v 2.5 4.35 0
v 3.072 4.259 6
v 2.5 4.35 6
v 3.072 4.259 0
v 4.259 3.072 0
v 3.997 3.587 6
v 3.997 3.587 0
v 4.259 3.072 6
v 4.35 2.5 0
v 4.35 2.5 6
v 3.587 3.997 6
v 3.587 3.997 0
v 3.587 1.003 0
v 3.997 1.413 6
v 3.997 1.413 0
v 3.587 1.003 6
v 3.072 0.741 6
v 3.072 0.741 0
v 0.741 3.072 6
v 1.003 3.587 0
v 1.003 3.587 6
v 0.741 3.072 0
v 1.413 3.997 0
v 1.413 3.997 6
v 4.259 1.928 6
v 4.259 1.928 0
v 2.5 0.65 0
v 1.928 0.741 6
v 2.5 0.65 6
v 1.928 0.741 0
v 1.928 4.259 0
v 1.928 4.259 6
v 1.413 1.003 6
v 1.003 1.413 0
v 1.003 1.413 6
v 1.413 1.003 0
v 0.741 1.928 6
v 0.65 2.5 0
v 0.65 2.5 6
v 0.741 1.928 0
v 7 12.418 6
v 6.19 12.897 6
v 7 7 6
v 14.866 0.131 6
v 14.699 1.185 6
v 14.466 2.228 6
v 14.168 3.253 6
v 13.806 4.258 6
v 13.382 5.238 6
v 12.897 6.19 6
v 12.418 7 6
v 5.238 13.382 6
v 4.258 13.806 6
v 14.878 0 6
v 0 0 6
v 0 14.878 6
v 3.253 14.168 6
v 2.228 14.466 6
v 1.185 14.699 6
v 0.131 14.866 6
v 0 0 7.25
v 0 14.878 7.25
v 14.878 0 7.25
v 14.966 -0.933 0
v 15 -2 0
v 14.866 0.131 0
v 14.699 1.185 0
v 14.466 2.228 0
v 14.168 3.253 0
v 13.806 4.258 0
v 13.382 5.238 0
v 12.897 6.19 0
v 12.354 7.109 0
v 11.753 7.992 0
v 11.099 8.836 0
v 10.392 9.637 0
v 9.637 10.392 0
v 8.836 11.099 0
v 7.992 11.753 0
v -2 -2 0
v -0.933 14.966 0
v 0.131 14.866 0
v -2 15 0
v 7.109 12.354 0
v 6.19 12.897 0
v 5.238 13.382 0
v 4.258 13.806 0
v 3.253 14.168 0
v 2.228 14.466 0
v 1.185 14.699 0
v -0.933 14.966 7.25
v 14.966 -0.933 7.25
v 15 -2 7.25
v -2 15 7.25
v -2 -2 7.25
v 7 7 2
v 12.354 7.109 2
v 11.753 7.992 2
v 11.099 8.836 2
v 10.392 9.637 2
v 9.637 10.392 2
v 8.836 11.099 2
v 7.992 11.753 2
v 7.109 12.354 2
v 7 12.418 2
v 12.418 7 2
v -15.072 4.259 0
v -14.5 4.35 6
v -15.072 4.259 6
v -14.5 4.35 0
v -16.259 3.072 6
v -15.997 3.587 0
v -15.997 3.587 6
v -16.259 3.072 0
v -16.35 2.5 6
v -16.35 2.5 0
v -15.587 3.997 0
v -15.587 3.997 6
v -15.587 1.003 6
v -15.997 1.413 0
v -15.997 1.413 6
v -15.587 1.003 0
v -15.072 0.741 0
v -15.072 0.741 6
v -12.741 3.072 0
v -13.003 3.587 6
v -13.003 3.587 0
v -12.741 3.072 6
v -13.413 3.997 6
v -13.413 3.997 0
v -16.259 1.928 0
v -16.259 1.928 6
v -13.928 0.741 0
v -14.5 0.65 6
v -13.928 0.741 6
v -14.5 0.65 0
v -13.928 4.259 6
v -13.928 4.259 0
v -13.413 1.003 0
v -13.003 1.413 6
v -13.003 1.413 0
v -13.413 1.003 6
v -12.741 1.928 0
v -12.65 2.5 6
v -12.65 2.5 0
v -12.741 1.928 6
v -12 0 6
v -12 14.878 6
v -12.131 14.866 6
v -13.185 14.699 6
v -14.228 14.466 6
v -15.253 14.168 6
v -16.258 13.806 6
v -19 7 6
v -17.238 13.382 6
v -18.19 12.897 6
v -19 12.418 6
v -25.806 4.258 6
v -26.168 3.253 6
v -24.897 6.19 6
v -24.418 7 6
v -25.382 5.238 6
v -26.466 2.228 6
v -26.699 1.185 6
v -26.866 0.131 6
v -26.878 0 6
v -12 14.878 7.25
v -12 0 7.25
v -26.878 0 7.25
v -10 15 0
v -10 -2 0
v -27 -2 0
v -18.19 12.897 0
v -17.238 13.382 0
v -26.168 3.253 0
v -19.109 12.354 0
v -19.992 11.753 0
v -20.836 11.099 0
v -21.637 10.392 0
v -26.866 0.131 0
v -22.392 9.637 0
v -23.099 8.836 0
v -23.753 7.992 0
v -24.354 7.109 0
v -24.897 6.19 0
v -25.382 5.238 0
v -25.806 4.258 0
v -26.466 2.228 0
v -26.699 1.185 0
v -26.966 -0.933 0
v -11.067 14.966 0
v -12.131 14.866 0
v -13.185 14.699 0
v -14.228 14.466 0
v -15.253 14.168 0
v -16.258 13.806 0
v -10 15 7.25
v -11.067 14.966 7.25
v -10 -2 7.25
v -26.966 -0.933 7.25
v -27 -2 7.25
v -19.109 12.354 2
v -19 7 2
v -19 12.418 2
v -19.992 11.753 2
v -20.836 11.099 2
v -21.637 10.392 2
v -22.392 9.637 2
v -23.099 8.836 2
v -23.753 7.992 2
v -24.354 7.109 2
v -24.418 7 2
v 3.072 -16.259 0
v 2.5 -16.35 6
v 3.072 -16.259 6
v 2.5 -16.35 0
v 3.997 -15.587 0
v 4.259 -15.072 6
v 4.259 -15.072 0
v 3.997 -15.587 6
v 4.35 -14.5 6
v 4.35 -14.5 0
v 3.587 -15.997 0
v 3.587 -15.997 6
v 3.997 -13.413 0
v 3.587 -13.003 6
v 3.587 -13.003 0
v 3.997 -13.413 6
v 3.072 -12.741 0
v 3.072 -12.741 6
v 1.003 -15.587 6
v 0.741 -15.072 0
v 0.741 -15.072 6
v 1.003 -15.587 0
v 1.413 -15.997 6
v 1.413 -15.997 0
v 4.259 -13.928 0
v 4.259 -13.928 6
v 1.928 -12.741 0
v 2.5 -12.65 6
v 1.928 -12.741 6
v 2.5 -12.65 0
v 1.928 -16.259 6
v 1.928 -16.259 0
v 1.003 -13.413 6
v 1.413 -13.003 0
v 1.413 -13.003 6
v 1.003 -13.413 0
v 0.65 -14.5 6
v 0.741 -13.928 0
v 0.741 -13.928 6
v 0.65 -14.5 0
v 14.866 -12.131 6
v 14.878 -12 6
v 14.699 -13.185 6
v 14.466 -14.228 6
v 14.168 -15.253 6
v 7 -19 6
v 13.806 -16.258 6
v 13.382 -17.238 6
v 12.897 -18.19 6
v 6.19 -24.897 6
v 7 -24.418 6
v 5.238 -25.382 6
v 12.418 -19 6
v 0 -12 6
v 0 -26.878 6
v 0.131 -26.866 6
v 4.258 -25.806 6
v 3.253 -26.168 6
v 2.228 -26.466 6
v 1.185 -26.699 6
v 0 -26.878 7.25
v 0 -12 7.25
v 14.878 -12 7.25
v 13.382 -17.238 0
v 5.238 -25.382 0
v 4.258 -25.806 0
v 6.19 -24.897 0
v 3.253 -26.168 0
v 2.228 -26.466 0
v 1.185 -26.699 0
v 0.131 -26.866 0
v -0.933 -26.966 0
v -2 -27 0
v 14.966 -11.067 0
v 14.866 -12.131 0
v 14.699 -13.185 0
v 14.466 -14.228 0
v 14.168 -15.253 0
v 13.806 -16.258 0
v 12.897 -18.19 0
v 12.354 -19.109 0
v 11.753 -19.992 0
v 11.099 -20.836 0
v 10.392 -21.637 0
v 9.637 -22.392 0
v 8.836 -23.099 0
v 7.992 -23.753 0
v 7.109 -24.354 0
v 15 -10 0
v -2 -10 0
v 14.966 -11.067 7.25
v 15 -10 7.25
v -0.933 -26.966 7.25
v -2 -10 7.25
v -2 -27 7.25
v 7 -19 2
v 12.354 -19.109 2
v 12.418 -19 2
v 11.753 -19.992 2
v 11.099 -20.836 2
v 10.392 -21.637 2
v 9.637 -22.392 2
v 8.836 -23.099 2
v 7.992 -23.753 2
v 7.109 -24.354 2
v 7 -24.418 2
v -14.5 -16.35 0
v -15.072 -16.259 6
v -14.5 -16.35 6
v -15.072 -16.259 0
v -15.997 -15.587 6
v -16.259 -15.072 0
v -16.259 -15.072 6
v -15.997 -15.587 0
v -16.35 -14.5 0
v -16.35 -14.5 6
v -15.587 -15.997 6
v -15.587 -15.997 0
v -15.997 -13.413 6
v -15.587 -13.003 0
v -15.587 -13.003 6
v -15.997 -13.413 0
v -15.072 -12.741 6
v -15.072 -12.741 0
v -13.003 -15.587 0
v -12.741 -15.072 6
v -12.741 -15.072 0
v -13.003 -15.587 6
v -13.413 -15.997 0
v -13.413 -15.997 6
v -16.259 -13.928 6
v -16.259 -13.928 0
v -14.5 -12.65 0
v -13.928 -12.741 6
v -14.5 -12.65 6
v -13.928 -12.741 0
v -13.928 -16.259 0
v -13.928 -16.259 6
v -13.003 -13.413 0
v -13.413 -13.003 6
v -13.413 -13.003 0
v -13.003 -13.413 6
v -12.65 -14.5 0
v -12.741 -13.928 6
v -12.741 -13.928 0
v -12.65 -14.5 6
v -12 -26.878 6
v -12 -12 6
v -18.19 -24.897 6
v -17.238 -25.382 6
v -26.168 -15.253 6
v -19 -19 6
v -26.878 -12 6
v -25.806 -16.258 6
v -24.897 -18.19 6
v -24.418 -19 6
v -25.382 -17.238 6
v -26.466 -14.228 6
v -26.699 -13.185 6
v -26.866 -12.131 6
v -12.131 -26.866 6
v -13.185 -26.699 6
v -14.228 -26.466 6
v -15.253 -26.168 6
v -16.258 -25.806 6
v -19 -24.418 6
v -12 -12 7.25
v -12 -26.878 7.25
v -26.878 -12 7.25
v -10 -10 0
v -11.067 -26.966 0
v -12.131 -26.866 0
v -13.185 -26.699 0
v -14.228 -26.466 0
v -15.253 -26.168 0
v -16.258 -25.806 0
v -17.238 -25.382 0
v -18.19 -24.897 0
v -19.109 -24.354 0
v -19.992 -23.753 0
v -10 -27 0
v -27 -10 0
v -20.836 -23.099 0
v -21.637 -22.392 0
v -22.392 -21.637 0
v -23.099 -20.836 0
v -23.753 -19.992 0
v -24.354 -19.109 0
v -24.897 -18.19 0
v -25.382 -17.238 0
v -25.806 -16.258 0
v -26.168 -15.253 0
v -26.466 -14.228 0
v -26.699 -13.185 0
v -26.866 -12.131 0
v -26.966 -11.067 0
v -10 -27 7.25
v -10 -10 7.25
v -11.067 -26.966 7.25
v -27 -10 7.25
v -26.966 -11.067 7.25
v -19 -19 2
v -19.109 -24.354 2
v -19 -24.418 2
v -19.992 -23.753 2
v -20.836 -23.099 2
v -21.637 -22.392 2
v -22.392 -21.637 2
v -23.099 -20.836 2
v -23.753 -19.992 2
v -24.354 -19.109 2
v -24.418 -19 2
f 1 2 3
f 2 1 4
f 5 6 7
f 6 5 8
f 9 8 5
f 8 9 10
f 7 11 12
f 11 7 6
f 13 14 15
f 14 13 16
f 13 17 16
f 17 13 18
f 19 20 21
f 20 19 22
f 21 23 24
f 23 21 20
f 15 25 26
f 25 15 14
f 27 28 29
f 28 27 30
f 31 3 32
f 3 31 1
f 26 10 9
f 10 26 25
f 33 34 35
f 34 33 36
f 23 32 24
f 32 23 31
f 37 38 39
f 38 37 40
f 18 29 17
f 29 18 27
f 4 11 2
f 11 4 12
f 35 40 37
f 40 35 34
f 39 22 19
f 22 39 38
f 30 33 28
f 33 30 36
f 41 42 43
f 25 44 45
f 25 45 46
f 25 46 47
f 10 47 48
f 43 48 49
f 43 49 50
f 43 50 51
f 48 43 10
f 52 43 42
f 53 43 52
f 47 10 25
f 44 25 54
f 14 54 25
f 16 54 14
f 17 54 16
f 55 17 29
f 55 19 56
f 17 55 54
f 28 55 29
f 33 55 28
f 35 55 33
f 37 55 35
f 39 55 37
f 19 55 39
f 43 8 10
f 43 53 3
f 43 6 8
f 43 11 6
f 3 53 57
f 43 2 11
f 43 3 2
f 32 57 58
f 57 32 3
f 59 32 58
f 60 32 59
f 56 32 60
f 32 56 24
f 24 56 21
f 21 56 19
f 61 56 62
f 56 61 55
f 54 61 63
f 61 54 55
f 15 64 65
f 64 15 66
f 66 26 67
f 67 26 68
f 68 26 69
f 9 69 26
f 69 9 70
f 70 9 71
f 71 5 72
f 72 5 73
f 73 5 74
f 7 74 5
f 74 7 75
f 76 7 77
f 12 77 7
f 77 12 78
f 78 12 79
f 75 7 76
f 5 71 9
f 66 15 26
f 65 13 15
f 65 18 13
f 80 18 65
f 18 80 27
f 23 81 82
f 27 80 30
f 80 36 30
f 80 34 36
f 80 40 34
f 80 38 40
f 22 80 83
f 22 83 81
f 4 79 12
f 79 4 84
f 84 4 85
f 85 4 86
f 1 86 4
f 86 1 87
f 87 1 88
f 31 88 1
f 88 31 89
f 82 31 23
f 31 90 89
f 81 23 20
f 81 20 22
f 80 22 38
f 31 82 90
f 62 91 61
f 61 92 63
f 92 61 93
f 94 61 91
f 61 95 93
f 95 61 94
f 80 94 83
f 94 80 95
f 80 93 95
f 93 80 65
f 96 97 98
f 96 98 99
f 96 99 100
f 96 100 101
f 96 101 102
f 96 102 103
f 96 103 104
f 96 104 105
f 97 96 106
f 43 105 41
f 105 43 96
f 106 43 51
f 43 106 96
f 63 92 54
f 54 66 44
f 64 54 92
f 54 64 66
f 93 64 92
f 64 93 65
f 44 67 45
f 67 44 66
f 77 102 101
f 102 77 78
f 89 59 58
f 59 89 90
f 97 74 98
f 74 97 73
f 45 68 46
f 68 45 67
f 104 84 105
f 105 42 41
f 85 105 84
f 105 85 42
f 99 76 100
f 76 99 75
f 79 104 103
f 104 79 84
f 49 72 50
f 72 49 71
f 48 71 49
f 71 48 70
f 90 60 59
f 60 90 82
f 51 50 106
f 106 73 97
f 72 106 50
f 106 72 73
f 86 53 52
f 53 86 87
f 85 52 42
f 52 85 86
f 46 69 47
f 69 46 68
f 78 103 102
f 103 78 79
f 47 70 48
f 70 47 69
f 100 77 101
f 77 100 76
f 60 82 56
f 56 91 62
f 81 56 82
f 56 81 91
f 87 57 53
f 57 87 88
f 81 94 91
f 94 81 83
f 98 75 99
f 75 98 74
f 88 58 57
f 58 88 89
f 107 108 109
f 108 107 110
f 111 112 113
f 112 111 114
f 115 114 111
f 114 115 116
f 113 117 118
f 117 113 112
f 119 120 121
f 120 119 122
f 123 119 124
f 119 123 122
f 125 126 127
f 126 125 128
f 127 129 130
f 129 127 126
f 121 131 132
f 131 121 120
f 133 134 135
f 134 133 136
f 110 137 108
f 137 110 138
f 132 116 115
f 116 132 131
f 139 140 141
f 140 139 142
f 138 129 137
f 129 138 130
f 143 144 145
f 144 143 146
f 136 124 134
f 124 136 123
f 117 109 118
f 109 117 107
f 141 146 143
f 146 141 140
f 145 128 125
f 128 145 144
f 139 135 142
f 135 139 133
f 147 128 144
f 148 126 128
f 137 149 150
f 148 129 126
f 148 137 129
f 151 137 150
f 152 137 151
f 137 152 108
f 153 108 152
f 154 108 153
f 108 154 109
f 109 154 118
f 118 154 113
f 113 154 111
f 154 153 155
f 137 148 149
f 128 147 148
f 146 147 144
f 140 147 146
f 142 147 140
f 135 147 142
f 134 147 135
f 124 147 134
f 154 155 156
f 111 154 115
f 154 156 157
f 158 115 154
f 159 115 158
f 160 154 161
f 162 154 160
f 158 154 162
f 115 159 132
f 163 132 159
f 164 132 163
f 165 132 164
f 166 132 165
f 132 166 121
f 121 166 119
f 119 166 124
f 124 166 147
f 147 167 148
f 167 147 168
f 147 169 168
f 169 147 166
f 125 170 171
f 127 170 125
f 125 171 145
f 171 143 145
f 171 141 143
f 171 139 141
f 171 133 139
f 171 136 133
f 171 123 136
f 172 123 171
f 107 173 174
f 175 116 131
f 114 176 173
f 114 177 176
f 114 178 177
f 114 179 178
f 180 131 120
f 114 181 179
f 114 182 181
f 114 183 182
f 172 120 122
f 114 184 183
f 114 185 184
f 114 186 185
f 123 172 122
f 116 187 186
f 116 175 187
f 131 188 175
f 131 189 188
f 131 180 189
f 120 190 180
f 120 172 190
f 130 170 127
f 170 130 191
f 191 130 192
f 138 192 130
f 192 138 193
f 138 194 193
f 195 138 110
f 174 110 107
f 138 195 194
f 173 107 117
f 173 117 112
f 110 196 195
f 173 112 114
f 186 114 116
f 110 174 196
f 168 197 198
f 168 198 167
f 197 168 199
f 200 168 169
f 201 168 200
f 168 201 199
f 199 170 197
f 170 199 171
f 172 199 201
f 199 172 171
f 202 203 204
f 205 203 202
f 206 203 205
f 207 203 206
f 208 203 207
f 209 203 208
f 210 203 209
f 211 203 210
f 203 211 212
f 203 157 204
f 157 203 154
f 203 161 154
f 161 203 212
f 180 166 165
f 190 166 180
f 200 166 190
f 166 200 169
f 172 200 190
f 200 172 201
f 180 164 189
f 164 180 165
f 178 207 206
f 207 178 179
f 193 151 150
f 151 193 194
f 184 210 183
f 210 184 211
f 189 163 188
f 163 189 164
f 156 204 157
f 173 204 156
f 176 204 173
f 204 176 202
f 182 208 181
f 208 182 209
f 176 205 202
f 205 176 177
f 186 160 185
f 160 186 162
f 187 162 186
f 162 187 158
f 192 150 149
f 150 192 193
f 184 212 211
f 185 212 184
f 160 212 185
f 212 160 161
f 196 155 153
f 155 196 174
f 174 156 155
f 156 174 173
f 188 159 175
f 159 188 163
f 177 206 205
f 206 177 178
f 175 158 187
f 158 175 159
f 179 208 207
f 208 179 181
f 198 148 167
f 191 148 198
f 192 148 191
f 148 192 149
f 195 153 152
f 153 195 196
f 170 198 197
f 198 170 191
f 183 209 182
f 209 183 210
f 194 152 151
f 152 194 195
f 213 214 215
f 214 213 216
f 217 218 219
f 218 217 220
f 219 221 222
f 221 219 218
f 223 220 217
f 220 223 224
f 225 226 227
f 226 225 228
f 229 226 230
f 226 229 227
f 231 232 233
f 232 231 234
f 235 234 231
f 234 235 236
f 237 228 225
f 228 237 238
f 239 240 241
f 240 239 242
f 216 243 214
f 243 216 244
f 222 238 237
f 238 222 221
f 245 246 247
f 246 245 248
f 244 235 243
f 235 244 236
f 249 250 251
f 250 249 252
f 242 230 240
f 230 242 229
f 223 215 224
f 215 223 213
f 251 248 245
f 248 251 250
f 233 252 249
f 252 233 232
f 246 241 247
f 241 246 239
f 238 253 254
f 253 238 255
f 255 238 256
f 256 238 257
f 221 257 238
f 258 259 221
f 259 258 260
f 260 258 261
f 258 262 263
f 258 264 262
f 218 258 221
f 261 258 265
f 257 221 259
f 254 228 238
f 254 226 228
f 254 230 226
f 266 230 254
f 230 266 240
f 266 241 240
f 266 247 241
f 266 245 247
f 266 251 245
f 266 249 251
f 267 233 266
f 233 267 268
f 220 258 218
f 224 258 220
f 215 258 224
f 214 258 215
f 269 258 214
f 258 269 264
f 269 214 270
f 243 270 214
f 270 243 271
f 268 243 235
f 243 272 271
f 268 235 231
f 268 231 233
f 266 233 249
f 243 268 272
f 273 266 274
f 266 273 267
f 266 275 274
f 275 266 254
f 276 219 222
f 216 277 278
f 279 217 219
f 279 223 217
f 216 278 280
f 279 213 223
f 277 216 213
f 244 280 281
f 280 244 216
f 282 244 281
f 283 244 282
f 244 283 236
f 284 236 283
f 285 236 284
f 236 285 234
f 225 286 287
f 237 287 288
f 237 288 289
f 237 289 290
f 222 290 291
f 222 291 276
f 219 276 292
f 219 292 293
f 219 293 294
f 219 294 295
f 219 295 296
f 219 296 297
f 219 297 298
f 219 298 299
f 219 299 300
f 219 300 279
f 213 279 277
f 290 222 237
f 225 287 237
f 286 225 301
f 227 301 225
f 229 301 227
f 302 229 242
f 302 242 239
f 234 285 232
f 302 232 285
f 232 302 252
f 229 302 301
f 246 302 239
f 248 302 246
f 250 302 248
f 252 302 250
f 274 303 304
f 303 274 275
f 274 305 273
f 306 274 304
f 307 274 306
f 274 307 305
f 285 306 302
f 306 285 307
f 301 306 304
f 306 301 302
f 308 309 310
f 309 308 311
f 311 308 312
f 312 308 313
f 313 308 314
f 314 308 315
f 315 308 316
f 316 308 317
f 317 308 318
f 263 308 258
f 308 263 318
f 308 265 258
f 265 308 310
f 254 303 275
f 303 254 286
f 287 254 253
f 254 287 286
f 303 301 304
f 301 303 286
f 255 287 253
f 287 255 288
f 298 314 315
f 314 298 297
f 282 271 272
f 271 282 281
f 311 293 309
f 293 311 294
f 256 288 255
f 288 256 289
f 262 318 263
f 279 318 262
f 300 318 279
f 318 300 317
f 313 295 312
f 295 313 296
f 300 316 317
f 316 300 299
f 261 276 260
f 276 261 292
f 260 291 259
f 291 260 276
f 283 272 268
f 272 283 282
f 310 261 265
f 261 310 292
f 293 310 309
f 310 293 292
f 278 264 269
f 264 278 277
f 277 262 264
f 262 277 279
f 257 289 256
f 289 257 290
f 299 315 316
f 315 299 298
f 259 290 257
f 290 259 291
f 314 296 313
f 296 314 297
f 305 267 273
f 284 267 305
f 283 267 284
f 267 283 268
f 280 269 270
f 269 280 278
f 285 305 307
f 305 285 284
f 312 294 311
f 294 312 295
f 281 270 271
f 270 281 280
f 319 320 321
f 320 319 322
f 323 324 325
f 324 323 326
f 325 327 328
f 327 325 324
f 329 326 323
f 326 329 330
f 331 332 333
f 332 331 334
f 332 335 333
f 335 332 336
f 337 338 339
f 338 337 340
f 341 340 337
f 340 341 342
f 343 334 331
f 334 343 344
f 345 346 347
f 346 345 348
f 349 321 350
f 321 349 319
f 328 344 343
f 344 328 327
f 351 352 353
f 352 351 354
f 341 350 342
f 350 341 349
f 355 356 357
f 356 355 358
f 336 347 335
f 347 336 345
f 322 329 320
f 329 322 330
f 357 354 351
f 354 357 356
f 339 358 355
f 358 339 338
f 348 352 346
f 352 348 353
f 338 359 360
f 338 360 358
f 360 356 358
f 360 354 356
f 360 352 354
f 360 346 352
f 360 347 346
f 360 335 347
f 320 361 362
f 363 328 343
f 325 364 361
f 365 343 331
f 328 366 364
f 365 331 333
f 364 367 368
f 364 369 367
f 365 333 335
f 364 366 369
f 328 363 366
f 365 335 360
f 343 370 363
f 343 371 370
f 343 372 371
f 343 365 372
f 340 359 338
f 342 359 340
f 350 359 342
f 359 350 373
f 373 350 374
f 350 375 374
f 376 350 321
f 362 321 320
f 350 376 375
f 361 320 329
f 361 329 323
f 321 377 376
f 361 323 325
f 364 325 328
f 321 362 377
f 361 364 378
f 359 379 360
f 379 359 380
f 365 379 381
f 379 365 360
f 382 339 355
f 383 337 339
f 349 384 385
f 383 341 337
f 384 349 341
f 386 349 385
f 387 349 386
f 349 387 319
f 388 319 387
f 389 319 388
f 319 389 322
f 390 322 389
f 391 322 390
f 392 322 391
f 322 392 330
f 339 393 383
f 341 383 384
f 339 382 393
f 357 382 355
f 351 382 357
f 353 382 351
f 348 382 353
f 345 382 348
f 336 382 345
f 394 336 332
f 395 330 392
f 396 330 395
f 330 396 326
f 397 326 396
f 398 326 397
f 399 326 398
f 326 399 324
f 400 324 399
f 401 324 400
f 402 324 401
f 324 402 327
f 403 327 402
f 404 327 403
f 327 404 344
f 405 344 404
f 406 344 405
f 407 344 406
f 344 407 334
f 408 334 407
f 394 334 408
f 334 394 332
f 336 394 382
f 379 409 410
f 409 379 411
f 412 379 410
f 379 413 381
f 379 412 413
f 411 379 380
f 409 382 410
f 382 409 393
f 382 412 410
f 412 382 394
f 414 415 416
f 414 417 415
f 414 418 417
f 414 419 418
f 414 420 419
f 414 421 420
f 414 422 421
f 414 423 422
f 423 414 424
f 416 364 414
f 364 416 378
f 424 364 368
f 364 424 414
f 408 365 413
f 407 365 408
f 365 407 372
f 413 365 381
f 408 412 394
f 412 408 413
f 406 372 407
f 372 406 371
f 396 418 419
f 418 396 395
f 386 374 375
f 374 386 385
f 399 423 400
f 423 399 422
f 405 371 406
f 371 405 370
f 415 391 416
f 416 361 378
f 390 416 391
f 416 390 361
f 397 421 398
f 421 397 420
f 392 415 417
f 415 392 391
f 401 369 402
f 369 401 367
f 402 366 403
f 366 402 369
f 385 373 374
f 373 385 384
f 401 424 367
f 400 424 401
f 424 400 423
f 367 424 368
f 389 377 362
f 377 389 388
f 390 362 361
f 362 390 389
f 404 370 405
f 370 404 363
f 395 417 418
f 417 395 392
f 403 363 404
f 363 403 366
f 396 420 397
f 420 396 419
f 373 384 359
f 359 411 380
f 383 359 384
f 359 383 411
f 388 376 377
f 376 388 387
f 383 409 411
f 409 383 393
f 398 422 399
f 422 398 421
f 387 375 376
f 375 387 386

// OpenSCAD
// [FL_INDEX: keywords="openscad, 3d_parametric, Heated_bed_glass_mount_clip, csg_solid" | COT="Parametric OpenSCAD design from 3DCodeverse"]
// Title: Heated bed glass mount clip

/* [HeatedBed] */

hotBedThickness = 2.5;
hotBedSizeX = 214; 
hotBedSizeY = 214; 
hotBedMountPointX = 2.5;
hotBedMountPointY = 2.5;
hotBedMountPointDiameter = 3.7;

/* [Glass] */

glassThickness = 4;
glassSizeX = 200;
glassSizeY = 200; 

/* [Mount] */

mountTopThickness = 2;
mountBorderThickness = 2;
mountGlassBorderThickness = 4;
mountSize = 15;


/* [Hidden] */

hotBedBoltLength = 20;

// Calculations
hotBedMountPoints = [[hotBedMountPointX,hotBedMountPointY,0],
							[hotBedMountPointX,hotBedSizeY-hotBedMountPointY,0],
							[hotBedSizeX-hotBedMountPointX,hotBedSizeY-hotBedMountPointY,0],
							[hotBedSizeX-hotBedMountPointX,hotBedMountPointY,0]];

// Hot Bed
module HotBed(){
	difference() {
		color("OrangeRed", 1) 
			cube([hotBedSizeX, hotBedSizeY, hotBedThickness]);
		HotBedBolts();
/*
		for (i = hotBedMountPoints)
		{
			translate(i) 
				cylinder(h=hotBedThickness,r=hotBedMountPointDiameter/2, $fn=10);
		}
*/
	}
}

module HotBedBolts(){
	for (i = hotBedMountPoints)
	{
		translate(i+[0,0,-5]) 
			cylinder(h=hotBedThickness+glassThickness+10,r=hotBedMountPointDiameter/2, $fn=20);
	}
}

module Glass() {
	glassPosition = [(hotBedSizeX-glassSizeX)/2,(hotBedSizeY-glassSizeY)/2,hotBedThickness];
	color("Azure",0.7) 
		translate(glassPosition) cube([glassSizeX, glassSizeY, glassThickness]);
}

module GlassMount() {
	mountTotalHeight=hotBedThickness/2+glassThickness+mountTopThickness;
	mountPosition=[-mountBorderThickness,-mountBorderThickness,hotBedThickness/2];
	intersection() {
	difference(){
		translate(mountPosition) 
			color("Blue")
				cube([mountSize+mountBorderThickness,mountSize+mountBorderThickness,mountTotalHeight]);	
		HotBed();
		HotBedBolts();
		Glass();
		// Substract top piece
	//	translate([mountGlassBorderThickness,mountGlassBorderThickness,mountTopThickness]) Glass();
		// Triangle
	}
		translate(mountPosition)cylinder(h=mountTotalHeight,r=mountSize+mountBorderThickness,$fn=100);
	}
}
 
//HotBed();
//HotBedBolts();
//Glass();
//GlassMount();

module GlassMountPair() {
	translate([0,0,glassThickness + hotBedThickness + mountTopThickness])
	mirror([0,0,90]){
		GlassMount();
		translate([-10-mountBorderThickness, 0, 0]) mirror() GlassMount();
	}
}

GlassMountPair();
translate([0, -10-mountBorderThickness, 0]) mirror([0,1,0]) GlassMountPair();
